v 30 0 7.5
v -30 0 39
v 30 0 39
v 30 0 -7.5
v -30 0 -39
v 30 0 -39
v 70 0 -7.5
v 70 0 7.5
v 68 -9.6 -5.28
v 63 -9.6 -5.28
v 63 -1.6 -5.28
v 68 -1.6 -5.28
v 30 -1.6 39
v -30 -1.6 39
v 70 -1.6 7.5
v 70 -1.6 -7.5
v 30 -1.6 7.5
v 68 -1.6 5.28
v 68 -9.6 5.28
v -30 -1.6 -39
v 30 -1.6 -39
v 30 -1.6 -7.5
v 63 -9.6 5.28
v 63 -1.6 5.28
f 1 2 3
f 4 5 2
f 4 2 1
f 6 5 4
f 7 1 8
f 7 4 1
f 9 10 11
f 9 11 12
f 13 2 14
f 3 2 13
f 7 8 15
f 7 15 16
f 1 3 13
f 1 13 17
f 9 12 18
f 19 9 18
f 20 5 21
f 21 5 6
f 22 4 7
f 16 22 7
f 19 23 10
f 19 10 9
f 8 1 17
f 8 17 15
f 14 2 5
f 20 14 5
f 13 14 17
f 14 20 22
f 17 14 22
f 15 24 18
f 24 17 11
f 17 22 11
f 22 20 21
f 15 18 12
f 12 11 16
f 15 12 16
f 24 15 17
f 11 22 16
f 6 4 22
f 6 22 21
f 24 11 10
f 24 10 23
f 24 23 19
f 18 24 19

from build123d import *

# Parameters (mm, degrees)
SKETCH1_W           = 60
SKETCH1_H           = 78
SKETCH1_W_2         = 40
SKETCH1_H_2         = 15
BOSS_EXTRUDE1_DEPTH = 1.6
SKETCH2_W           = 5
SKETCH2_H           = 10.56
BOSS_EXTRUDE2_DEPTH = 8


with BuildPart() as part:
    # Sketch1 → Boss-Extrude1 (new body)
    with BuildSketch(Plane(origin=(0, 0, 0), x_dir=(1, 0, 0), z_dir=(0, 1, 0))):
        Rectangle(SKETCH1_W, SKETCH1_H)
        with Locations((50, 0)):
            Rectangle(SKETCH1_W_2, SKETCH1_H_2)
    extrude(amount=-BOSS_EXTRUDE1_DEPTH)

    # Sketch2 → Boss-Extrude2 (add)
    with BuildSketch(Plane.XZ.offset(1.6)):
        with Locations((65.5, 0)):
            Rectangle(SKETCH2_W, SKETCH2_H)
    extrude(amount=BOSS_EXTRUDE2_DEPTH)


solid = part.part
